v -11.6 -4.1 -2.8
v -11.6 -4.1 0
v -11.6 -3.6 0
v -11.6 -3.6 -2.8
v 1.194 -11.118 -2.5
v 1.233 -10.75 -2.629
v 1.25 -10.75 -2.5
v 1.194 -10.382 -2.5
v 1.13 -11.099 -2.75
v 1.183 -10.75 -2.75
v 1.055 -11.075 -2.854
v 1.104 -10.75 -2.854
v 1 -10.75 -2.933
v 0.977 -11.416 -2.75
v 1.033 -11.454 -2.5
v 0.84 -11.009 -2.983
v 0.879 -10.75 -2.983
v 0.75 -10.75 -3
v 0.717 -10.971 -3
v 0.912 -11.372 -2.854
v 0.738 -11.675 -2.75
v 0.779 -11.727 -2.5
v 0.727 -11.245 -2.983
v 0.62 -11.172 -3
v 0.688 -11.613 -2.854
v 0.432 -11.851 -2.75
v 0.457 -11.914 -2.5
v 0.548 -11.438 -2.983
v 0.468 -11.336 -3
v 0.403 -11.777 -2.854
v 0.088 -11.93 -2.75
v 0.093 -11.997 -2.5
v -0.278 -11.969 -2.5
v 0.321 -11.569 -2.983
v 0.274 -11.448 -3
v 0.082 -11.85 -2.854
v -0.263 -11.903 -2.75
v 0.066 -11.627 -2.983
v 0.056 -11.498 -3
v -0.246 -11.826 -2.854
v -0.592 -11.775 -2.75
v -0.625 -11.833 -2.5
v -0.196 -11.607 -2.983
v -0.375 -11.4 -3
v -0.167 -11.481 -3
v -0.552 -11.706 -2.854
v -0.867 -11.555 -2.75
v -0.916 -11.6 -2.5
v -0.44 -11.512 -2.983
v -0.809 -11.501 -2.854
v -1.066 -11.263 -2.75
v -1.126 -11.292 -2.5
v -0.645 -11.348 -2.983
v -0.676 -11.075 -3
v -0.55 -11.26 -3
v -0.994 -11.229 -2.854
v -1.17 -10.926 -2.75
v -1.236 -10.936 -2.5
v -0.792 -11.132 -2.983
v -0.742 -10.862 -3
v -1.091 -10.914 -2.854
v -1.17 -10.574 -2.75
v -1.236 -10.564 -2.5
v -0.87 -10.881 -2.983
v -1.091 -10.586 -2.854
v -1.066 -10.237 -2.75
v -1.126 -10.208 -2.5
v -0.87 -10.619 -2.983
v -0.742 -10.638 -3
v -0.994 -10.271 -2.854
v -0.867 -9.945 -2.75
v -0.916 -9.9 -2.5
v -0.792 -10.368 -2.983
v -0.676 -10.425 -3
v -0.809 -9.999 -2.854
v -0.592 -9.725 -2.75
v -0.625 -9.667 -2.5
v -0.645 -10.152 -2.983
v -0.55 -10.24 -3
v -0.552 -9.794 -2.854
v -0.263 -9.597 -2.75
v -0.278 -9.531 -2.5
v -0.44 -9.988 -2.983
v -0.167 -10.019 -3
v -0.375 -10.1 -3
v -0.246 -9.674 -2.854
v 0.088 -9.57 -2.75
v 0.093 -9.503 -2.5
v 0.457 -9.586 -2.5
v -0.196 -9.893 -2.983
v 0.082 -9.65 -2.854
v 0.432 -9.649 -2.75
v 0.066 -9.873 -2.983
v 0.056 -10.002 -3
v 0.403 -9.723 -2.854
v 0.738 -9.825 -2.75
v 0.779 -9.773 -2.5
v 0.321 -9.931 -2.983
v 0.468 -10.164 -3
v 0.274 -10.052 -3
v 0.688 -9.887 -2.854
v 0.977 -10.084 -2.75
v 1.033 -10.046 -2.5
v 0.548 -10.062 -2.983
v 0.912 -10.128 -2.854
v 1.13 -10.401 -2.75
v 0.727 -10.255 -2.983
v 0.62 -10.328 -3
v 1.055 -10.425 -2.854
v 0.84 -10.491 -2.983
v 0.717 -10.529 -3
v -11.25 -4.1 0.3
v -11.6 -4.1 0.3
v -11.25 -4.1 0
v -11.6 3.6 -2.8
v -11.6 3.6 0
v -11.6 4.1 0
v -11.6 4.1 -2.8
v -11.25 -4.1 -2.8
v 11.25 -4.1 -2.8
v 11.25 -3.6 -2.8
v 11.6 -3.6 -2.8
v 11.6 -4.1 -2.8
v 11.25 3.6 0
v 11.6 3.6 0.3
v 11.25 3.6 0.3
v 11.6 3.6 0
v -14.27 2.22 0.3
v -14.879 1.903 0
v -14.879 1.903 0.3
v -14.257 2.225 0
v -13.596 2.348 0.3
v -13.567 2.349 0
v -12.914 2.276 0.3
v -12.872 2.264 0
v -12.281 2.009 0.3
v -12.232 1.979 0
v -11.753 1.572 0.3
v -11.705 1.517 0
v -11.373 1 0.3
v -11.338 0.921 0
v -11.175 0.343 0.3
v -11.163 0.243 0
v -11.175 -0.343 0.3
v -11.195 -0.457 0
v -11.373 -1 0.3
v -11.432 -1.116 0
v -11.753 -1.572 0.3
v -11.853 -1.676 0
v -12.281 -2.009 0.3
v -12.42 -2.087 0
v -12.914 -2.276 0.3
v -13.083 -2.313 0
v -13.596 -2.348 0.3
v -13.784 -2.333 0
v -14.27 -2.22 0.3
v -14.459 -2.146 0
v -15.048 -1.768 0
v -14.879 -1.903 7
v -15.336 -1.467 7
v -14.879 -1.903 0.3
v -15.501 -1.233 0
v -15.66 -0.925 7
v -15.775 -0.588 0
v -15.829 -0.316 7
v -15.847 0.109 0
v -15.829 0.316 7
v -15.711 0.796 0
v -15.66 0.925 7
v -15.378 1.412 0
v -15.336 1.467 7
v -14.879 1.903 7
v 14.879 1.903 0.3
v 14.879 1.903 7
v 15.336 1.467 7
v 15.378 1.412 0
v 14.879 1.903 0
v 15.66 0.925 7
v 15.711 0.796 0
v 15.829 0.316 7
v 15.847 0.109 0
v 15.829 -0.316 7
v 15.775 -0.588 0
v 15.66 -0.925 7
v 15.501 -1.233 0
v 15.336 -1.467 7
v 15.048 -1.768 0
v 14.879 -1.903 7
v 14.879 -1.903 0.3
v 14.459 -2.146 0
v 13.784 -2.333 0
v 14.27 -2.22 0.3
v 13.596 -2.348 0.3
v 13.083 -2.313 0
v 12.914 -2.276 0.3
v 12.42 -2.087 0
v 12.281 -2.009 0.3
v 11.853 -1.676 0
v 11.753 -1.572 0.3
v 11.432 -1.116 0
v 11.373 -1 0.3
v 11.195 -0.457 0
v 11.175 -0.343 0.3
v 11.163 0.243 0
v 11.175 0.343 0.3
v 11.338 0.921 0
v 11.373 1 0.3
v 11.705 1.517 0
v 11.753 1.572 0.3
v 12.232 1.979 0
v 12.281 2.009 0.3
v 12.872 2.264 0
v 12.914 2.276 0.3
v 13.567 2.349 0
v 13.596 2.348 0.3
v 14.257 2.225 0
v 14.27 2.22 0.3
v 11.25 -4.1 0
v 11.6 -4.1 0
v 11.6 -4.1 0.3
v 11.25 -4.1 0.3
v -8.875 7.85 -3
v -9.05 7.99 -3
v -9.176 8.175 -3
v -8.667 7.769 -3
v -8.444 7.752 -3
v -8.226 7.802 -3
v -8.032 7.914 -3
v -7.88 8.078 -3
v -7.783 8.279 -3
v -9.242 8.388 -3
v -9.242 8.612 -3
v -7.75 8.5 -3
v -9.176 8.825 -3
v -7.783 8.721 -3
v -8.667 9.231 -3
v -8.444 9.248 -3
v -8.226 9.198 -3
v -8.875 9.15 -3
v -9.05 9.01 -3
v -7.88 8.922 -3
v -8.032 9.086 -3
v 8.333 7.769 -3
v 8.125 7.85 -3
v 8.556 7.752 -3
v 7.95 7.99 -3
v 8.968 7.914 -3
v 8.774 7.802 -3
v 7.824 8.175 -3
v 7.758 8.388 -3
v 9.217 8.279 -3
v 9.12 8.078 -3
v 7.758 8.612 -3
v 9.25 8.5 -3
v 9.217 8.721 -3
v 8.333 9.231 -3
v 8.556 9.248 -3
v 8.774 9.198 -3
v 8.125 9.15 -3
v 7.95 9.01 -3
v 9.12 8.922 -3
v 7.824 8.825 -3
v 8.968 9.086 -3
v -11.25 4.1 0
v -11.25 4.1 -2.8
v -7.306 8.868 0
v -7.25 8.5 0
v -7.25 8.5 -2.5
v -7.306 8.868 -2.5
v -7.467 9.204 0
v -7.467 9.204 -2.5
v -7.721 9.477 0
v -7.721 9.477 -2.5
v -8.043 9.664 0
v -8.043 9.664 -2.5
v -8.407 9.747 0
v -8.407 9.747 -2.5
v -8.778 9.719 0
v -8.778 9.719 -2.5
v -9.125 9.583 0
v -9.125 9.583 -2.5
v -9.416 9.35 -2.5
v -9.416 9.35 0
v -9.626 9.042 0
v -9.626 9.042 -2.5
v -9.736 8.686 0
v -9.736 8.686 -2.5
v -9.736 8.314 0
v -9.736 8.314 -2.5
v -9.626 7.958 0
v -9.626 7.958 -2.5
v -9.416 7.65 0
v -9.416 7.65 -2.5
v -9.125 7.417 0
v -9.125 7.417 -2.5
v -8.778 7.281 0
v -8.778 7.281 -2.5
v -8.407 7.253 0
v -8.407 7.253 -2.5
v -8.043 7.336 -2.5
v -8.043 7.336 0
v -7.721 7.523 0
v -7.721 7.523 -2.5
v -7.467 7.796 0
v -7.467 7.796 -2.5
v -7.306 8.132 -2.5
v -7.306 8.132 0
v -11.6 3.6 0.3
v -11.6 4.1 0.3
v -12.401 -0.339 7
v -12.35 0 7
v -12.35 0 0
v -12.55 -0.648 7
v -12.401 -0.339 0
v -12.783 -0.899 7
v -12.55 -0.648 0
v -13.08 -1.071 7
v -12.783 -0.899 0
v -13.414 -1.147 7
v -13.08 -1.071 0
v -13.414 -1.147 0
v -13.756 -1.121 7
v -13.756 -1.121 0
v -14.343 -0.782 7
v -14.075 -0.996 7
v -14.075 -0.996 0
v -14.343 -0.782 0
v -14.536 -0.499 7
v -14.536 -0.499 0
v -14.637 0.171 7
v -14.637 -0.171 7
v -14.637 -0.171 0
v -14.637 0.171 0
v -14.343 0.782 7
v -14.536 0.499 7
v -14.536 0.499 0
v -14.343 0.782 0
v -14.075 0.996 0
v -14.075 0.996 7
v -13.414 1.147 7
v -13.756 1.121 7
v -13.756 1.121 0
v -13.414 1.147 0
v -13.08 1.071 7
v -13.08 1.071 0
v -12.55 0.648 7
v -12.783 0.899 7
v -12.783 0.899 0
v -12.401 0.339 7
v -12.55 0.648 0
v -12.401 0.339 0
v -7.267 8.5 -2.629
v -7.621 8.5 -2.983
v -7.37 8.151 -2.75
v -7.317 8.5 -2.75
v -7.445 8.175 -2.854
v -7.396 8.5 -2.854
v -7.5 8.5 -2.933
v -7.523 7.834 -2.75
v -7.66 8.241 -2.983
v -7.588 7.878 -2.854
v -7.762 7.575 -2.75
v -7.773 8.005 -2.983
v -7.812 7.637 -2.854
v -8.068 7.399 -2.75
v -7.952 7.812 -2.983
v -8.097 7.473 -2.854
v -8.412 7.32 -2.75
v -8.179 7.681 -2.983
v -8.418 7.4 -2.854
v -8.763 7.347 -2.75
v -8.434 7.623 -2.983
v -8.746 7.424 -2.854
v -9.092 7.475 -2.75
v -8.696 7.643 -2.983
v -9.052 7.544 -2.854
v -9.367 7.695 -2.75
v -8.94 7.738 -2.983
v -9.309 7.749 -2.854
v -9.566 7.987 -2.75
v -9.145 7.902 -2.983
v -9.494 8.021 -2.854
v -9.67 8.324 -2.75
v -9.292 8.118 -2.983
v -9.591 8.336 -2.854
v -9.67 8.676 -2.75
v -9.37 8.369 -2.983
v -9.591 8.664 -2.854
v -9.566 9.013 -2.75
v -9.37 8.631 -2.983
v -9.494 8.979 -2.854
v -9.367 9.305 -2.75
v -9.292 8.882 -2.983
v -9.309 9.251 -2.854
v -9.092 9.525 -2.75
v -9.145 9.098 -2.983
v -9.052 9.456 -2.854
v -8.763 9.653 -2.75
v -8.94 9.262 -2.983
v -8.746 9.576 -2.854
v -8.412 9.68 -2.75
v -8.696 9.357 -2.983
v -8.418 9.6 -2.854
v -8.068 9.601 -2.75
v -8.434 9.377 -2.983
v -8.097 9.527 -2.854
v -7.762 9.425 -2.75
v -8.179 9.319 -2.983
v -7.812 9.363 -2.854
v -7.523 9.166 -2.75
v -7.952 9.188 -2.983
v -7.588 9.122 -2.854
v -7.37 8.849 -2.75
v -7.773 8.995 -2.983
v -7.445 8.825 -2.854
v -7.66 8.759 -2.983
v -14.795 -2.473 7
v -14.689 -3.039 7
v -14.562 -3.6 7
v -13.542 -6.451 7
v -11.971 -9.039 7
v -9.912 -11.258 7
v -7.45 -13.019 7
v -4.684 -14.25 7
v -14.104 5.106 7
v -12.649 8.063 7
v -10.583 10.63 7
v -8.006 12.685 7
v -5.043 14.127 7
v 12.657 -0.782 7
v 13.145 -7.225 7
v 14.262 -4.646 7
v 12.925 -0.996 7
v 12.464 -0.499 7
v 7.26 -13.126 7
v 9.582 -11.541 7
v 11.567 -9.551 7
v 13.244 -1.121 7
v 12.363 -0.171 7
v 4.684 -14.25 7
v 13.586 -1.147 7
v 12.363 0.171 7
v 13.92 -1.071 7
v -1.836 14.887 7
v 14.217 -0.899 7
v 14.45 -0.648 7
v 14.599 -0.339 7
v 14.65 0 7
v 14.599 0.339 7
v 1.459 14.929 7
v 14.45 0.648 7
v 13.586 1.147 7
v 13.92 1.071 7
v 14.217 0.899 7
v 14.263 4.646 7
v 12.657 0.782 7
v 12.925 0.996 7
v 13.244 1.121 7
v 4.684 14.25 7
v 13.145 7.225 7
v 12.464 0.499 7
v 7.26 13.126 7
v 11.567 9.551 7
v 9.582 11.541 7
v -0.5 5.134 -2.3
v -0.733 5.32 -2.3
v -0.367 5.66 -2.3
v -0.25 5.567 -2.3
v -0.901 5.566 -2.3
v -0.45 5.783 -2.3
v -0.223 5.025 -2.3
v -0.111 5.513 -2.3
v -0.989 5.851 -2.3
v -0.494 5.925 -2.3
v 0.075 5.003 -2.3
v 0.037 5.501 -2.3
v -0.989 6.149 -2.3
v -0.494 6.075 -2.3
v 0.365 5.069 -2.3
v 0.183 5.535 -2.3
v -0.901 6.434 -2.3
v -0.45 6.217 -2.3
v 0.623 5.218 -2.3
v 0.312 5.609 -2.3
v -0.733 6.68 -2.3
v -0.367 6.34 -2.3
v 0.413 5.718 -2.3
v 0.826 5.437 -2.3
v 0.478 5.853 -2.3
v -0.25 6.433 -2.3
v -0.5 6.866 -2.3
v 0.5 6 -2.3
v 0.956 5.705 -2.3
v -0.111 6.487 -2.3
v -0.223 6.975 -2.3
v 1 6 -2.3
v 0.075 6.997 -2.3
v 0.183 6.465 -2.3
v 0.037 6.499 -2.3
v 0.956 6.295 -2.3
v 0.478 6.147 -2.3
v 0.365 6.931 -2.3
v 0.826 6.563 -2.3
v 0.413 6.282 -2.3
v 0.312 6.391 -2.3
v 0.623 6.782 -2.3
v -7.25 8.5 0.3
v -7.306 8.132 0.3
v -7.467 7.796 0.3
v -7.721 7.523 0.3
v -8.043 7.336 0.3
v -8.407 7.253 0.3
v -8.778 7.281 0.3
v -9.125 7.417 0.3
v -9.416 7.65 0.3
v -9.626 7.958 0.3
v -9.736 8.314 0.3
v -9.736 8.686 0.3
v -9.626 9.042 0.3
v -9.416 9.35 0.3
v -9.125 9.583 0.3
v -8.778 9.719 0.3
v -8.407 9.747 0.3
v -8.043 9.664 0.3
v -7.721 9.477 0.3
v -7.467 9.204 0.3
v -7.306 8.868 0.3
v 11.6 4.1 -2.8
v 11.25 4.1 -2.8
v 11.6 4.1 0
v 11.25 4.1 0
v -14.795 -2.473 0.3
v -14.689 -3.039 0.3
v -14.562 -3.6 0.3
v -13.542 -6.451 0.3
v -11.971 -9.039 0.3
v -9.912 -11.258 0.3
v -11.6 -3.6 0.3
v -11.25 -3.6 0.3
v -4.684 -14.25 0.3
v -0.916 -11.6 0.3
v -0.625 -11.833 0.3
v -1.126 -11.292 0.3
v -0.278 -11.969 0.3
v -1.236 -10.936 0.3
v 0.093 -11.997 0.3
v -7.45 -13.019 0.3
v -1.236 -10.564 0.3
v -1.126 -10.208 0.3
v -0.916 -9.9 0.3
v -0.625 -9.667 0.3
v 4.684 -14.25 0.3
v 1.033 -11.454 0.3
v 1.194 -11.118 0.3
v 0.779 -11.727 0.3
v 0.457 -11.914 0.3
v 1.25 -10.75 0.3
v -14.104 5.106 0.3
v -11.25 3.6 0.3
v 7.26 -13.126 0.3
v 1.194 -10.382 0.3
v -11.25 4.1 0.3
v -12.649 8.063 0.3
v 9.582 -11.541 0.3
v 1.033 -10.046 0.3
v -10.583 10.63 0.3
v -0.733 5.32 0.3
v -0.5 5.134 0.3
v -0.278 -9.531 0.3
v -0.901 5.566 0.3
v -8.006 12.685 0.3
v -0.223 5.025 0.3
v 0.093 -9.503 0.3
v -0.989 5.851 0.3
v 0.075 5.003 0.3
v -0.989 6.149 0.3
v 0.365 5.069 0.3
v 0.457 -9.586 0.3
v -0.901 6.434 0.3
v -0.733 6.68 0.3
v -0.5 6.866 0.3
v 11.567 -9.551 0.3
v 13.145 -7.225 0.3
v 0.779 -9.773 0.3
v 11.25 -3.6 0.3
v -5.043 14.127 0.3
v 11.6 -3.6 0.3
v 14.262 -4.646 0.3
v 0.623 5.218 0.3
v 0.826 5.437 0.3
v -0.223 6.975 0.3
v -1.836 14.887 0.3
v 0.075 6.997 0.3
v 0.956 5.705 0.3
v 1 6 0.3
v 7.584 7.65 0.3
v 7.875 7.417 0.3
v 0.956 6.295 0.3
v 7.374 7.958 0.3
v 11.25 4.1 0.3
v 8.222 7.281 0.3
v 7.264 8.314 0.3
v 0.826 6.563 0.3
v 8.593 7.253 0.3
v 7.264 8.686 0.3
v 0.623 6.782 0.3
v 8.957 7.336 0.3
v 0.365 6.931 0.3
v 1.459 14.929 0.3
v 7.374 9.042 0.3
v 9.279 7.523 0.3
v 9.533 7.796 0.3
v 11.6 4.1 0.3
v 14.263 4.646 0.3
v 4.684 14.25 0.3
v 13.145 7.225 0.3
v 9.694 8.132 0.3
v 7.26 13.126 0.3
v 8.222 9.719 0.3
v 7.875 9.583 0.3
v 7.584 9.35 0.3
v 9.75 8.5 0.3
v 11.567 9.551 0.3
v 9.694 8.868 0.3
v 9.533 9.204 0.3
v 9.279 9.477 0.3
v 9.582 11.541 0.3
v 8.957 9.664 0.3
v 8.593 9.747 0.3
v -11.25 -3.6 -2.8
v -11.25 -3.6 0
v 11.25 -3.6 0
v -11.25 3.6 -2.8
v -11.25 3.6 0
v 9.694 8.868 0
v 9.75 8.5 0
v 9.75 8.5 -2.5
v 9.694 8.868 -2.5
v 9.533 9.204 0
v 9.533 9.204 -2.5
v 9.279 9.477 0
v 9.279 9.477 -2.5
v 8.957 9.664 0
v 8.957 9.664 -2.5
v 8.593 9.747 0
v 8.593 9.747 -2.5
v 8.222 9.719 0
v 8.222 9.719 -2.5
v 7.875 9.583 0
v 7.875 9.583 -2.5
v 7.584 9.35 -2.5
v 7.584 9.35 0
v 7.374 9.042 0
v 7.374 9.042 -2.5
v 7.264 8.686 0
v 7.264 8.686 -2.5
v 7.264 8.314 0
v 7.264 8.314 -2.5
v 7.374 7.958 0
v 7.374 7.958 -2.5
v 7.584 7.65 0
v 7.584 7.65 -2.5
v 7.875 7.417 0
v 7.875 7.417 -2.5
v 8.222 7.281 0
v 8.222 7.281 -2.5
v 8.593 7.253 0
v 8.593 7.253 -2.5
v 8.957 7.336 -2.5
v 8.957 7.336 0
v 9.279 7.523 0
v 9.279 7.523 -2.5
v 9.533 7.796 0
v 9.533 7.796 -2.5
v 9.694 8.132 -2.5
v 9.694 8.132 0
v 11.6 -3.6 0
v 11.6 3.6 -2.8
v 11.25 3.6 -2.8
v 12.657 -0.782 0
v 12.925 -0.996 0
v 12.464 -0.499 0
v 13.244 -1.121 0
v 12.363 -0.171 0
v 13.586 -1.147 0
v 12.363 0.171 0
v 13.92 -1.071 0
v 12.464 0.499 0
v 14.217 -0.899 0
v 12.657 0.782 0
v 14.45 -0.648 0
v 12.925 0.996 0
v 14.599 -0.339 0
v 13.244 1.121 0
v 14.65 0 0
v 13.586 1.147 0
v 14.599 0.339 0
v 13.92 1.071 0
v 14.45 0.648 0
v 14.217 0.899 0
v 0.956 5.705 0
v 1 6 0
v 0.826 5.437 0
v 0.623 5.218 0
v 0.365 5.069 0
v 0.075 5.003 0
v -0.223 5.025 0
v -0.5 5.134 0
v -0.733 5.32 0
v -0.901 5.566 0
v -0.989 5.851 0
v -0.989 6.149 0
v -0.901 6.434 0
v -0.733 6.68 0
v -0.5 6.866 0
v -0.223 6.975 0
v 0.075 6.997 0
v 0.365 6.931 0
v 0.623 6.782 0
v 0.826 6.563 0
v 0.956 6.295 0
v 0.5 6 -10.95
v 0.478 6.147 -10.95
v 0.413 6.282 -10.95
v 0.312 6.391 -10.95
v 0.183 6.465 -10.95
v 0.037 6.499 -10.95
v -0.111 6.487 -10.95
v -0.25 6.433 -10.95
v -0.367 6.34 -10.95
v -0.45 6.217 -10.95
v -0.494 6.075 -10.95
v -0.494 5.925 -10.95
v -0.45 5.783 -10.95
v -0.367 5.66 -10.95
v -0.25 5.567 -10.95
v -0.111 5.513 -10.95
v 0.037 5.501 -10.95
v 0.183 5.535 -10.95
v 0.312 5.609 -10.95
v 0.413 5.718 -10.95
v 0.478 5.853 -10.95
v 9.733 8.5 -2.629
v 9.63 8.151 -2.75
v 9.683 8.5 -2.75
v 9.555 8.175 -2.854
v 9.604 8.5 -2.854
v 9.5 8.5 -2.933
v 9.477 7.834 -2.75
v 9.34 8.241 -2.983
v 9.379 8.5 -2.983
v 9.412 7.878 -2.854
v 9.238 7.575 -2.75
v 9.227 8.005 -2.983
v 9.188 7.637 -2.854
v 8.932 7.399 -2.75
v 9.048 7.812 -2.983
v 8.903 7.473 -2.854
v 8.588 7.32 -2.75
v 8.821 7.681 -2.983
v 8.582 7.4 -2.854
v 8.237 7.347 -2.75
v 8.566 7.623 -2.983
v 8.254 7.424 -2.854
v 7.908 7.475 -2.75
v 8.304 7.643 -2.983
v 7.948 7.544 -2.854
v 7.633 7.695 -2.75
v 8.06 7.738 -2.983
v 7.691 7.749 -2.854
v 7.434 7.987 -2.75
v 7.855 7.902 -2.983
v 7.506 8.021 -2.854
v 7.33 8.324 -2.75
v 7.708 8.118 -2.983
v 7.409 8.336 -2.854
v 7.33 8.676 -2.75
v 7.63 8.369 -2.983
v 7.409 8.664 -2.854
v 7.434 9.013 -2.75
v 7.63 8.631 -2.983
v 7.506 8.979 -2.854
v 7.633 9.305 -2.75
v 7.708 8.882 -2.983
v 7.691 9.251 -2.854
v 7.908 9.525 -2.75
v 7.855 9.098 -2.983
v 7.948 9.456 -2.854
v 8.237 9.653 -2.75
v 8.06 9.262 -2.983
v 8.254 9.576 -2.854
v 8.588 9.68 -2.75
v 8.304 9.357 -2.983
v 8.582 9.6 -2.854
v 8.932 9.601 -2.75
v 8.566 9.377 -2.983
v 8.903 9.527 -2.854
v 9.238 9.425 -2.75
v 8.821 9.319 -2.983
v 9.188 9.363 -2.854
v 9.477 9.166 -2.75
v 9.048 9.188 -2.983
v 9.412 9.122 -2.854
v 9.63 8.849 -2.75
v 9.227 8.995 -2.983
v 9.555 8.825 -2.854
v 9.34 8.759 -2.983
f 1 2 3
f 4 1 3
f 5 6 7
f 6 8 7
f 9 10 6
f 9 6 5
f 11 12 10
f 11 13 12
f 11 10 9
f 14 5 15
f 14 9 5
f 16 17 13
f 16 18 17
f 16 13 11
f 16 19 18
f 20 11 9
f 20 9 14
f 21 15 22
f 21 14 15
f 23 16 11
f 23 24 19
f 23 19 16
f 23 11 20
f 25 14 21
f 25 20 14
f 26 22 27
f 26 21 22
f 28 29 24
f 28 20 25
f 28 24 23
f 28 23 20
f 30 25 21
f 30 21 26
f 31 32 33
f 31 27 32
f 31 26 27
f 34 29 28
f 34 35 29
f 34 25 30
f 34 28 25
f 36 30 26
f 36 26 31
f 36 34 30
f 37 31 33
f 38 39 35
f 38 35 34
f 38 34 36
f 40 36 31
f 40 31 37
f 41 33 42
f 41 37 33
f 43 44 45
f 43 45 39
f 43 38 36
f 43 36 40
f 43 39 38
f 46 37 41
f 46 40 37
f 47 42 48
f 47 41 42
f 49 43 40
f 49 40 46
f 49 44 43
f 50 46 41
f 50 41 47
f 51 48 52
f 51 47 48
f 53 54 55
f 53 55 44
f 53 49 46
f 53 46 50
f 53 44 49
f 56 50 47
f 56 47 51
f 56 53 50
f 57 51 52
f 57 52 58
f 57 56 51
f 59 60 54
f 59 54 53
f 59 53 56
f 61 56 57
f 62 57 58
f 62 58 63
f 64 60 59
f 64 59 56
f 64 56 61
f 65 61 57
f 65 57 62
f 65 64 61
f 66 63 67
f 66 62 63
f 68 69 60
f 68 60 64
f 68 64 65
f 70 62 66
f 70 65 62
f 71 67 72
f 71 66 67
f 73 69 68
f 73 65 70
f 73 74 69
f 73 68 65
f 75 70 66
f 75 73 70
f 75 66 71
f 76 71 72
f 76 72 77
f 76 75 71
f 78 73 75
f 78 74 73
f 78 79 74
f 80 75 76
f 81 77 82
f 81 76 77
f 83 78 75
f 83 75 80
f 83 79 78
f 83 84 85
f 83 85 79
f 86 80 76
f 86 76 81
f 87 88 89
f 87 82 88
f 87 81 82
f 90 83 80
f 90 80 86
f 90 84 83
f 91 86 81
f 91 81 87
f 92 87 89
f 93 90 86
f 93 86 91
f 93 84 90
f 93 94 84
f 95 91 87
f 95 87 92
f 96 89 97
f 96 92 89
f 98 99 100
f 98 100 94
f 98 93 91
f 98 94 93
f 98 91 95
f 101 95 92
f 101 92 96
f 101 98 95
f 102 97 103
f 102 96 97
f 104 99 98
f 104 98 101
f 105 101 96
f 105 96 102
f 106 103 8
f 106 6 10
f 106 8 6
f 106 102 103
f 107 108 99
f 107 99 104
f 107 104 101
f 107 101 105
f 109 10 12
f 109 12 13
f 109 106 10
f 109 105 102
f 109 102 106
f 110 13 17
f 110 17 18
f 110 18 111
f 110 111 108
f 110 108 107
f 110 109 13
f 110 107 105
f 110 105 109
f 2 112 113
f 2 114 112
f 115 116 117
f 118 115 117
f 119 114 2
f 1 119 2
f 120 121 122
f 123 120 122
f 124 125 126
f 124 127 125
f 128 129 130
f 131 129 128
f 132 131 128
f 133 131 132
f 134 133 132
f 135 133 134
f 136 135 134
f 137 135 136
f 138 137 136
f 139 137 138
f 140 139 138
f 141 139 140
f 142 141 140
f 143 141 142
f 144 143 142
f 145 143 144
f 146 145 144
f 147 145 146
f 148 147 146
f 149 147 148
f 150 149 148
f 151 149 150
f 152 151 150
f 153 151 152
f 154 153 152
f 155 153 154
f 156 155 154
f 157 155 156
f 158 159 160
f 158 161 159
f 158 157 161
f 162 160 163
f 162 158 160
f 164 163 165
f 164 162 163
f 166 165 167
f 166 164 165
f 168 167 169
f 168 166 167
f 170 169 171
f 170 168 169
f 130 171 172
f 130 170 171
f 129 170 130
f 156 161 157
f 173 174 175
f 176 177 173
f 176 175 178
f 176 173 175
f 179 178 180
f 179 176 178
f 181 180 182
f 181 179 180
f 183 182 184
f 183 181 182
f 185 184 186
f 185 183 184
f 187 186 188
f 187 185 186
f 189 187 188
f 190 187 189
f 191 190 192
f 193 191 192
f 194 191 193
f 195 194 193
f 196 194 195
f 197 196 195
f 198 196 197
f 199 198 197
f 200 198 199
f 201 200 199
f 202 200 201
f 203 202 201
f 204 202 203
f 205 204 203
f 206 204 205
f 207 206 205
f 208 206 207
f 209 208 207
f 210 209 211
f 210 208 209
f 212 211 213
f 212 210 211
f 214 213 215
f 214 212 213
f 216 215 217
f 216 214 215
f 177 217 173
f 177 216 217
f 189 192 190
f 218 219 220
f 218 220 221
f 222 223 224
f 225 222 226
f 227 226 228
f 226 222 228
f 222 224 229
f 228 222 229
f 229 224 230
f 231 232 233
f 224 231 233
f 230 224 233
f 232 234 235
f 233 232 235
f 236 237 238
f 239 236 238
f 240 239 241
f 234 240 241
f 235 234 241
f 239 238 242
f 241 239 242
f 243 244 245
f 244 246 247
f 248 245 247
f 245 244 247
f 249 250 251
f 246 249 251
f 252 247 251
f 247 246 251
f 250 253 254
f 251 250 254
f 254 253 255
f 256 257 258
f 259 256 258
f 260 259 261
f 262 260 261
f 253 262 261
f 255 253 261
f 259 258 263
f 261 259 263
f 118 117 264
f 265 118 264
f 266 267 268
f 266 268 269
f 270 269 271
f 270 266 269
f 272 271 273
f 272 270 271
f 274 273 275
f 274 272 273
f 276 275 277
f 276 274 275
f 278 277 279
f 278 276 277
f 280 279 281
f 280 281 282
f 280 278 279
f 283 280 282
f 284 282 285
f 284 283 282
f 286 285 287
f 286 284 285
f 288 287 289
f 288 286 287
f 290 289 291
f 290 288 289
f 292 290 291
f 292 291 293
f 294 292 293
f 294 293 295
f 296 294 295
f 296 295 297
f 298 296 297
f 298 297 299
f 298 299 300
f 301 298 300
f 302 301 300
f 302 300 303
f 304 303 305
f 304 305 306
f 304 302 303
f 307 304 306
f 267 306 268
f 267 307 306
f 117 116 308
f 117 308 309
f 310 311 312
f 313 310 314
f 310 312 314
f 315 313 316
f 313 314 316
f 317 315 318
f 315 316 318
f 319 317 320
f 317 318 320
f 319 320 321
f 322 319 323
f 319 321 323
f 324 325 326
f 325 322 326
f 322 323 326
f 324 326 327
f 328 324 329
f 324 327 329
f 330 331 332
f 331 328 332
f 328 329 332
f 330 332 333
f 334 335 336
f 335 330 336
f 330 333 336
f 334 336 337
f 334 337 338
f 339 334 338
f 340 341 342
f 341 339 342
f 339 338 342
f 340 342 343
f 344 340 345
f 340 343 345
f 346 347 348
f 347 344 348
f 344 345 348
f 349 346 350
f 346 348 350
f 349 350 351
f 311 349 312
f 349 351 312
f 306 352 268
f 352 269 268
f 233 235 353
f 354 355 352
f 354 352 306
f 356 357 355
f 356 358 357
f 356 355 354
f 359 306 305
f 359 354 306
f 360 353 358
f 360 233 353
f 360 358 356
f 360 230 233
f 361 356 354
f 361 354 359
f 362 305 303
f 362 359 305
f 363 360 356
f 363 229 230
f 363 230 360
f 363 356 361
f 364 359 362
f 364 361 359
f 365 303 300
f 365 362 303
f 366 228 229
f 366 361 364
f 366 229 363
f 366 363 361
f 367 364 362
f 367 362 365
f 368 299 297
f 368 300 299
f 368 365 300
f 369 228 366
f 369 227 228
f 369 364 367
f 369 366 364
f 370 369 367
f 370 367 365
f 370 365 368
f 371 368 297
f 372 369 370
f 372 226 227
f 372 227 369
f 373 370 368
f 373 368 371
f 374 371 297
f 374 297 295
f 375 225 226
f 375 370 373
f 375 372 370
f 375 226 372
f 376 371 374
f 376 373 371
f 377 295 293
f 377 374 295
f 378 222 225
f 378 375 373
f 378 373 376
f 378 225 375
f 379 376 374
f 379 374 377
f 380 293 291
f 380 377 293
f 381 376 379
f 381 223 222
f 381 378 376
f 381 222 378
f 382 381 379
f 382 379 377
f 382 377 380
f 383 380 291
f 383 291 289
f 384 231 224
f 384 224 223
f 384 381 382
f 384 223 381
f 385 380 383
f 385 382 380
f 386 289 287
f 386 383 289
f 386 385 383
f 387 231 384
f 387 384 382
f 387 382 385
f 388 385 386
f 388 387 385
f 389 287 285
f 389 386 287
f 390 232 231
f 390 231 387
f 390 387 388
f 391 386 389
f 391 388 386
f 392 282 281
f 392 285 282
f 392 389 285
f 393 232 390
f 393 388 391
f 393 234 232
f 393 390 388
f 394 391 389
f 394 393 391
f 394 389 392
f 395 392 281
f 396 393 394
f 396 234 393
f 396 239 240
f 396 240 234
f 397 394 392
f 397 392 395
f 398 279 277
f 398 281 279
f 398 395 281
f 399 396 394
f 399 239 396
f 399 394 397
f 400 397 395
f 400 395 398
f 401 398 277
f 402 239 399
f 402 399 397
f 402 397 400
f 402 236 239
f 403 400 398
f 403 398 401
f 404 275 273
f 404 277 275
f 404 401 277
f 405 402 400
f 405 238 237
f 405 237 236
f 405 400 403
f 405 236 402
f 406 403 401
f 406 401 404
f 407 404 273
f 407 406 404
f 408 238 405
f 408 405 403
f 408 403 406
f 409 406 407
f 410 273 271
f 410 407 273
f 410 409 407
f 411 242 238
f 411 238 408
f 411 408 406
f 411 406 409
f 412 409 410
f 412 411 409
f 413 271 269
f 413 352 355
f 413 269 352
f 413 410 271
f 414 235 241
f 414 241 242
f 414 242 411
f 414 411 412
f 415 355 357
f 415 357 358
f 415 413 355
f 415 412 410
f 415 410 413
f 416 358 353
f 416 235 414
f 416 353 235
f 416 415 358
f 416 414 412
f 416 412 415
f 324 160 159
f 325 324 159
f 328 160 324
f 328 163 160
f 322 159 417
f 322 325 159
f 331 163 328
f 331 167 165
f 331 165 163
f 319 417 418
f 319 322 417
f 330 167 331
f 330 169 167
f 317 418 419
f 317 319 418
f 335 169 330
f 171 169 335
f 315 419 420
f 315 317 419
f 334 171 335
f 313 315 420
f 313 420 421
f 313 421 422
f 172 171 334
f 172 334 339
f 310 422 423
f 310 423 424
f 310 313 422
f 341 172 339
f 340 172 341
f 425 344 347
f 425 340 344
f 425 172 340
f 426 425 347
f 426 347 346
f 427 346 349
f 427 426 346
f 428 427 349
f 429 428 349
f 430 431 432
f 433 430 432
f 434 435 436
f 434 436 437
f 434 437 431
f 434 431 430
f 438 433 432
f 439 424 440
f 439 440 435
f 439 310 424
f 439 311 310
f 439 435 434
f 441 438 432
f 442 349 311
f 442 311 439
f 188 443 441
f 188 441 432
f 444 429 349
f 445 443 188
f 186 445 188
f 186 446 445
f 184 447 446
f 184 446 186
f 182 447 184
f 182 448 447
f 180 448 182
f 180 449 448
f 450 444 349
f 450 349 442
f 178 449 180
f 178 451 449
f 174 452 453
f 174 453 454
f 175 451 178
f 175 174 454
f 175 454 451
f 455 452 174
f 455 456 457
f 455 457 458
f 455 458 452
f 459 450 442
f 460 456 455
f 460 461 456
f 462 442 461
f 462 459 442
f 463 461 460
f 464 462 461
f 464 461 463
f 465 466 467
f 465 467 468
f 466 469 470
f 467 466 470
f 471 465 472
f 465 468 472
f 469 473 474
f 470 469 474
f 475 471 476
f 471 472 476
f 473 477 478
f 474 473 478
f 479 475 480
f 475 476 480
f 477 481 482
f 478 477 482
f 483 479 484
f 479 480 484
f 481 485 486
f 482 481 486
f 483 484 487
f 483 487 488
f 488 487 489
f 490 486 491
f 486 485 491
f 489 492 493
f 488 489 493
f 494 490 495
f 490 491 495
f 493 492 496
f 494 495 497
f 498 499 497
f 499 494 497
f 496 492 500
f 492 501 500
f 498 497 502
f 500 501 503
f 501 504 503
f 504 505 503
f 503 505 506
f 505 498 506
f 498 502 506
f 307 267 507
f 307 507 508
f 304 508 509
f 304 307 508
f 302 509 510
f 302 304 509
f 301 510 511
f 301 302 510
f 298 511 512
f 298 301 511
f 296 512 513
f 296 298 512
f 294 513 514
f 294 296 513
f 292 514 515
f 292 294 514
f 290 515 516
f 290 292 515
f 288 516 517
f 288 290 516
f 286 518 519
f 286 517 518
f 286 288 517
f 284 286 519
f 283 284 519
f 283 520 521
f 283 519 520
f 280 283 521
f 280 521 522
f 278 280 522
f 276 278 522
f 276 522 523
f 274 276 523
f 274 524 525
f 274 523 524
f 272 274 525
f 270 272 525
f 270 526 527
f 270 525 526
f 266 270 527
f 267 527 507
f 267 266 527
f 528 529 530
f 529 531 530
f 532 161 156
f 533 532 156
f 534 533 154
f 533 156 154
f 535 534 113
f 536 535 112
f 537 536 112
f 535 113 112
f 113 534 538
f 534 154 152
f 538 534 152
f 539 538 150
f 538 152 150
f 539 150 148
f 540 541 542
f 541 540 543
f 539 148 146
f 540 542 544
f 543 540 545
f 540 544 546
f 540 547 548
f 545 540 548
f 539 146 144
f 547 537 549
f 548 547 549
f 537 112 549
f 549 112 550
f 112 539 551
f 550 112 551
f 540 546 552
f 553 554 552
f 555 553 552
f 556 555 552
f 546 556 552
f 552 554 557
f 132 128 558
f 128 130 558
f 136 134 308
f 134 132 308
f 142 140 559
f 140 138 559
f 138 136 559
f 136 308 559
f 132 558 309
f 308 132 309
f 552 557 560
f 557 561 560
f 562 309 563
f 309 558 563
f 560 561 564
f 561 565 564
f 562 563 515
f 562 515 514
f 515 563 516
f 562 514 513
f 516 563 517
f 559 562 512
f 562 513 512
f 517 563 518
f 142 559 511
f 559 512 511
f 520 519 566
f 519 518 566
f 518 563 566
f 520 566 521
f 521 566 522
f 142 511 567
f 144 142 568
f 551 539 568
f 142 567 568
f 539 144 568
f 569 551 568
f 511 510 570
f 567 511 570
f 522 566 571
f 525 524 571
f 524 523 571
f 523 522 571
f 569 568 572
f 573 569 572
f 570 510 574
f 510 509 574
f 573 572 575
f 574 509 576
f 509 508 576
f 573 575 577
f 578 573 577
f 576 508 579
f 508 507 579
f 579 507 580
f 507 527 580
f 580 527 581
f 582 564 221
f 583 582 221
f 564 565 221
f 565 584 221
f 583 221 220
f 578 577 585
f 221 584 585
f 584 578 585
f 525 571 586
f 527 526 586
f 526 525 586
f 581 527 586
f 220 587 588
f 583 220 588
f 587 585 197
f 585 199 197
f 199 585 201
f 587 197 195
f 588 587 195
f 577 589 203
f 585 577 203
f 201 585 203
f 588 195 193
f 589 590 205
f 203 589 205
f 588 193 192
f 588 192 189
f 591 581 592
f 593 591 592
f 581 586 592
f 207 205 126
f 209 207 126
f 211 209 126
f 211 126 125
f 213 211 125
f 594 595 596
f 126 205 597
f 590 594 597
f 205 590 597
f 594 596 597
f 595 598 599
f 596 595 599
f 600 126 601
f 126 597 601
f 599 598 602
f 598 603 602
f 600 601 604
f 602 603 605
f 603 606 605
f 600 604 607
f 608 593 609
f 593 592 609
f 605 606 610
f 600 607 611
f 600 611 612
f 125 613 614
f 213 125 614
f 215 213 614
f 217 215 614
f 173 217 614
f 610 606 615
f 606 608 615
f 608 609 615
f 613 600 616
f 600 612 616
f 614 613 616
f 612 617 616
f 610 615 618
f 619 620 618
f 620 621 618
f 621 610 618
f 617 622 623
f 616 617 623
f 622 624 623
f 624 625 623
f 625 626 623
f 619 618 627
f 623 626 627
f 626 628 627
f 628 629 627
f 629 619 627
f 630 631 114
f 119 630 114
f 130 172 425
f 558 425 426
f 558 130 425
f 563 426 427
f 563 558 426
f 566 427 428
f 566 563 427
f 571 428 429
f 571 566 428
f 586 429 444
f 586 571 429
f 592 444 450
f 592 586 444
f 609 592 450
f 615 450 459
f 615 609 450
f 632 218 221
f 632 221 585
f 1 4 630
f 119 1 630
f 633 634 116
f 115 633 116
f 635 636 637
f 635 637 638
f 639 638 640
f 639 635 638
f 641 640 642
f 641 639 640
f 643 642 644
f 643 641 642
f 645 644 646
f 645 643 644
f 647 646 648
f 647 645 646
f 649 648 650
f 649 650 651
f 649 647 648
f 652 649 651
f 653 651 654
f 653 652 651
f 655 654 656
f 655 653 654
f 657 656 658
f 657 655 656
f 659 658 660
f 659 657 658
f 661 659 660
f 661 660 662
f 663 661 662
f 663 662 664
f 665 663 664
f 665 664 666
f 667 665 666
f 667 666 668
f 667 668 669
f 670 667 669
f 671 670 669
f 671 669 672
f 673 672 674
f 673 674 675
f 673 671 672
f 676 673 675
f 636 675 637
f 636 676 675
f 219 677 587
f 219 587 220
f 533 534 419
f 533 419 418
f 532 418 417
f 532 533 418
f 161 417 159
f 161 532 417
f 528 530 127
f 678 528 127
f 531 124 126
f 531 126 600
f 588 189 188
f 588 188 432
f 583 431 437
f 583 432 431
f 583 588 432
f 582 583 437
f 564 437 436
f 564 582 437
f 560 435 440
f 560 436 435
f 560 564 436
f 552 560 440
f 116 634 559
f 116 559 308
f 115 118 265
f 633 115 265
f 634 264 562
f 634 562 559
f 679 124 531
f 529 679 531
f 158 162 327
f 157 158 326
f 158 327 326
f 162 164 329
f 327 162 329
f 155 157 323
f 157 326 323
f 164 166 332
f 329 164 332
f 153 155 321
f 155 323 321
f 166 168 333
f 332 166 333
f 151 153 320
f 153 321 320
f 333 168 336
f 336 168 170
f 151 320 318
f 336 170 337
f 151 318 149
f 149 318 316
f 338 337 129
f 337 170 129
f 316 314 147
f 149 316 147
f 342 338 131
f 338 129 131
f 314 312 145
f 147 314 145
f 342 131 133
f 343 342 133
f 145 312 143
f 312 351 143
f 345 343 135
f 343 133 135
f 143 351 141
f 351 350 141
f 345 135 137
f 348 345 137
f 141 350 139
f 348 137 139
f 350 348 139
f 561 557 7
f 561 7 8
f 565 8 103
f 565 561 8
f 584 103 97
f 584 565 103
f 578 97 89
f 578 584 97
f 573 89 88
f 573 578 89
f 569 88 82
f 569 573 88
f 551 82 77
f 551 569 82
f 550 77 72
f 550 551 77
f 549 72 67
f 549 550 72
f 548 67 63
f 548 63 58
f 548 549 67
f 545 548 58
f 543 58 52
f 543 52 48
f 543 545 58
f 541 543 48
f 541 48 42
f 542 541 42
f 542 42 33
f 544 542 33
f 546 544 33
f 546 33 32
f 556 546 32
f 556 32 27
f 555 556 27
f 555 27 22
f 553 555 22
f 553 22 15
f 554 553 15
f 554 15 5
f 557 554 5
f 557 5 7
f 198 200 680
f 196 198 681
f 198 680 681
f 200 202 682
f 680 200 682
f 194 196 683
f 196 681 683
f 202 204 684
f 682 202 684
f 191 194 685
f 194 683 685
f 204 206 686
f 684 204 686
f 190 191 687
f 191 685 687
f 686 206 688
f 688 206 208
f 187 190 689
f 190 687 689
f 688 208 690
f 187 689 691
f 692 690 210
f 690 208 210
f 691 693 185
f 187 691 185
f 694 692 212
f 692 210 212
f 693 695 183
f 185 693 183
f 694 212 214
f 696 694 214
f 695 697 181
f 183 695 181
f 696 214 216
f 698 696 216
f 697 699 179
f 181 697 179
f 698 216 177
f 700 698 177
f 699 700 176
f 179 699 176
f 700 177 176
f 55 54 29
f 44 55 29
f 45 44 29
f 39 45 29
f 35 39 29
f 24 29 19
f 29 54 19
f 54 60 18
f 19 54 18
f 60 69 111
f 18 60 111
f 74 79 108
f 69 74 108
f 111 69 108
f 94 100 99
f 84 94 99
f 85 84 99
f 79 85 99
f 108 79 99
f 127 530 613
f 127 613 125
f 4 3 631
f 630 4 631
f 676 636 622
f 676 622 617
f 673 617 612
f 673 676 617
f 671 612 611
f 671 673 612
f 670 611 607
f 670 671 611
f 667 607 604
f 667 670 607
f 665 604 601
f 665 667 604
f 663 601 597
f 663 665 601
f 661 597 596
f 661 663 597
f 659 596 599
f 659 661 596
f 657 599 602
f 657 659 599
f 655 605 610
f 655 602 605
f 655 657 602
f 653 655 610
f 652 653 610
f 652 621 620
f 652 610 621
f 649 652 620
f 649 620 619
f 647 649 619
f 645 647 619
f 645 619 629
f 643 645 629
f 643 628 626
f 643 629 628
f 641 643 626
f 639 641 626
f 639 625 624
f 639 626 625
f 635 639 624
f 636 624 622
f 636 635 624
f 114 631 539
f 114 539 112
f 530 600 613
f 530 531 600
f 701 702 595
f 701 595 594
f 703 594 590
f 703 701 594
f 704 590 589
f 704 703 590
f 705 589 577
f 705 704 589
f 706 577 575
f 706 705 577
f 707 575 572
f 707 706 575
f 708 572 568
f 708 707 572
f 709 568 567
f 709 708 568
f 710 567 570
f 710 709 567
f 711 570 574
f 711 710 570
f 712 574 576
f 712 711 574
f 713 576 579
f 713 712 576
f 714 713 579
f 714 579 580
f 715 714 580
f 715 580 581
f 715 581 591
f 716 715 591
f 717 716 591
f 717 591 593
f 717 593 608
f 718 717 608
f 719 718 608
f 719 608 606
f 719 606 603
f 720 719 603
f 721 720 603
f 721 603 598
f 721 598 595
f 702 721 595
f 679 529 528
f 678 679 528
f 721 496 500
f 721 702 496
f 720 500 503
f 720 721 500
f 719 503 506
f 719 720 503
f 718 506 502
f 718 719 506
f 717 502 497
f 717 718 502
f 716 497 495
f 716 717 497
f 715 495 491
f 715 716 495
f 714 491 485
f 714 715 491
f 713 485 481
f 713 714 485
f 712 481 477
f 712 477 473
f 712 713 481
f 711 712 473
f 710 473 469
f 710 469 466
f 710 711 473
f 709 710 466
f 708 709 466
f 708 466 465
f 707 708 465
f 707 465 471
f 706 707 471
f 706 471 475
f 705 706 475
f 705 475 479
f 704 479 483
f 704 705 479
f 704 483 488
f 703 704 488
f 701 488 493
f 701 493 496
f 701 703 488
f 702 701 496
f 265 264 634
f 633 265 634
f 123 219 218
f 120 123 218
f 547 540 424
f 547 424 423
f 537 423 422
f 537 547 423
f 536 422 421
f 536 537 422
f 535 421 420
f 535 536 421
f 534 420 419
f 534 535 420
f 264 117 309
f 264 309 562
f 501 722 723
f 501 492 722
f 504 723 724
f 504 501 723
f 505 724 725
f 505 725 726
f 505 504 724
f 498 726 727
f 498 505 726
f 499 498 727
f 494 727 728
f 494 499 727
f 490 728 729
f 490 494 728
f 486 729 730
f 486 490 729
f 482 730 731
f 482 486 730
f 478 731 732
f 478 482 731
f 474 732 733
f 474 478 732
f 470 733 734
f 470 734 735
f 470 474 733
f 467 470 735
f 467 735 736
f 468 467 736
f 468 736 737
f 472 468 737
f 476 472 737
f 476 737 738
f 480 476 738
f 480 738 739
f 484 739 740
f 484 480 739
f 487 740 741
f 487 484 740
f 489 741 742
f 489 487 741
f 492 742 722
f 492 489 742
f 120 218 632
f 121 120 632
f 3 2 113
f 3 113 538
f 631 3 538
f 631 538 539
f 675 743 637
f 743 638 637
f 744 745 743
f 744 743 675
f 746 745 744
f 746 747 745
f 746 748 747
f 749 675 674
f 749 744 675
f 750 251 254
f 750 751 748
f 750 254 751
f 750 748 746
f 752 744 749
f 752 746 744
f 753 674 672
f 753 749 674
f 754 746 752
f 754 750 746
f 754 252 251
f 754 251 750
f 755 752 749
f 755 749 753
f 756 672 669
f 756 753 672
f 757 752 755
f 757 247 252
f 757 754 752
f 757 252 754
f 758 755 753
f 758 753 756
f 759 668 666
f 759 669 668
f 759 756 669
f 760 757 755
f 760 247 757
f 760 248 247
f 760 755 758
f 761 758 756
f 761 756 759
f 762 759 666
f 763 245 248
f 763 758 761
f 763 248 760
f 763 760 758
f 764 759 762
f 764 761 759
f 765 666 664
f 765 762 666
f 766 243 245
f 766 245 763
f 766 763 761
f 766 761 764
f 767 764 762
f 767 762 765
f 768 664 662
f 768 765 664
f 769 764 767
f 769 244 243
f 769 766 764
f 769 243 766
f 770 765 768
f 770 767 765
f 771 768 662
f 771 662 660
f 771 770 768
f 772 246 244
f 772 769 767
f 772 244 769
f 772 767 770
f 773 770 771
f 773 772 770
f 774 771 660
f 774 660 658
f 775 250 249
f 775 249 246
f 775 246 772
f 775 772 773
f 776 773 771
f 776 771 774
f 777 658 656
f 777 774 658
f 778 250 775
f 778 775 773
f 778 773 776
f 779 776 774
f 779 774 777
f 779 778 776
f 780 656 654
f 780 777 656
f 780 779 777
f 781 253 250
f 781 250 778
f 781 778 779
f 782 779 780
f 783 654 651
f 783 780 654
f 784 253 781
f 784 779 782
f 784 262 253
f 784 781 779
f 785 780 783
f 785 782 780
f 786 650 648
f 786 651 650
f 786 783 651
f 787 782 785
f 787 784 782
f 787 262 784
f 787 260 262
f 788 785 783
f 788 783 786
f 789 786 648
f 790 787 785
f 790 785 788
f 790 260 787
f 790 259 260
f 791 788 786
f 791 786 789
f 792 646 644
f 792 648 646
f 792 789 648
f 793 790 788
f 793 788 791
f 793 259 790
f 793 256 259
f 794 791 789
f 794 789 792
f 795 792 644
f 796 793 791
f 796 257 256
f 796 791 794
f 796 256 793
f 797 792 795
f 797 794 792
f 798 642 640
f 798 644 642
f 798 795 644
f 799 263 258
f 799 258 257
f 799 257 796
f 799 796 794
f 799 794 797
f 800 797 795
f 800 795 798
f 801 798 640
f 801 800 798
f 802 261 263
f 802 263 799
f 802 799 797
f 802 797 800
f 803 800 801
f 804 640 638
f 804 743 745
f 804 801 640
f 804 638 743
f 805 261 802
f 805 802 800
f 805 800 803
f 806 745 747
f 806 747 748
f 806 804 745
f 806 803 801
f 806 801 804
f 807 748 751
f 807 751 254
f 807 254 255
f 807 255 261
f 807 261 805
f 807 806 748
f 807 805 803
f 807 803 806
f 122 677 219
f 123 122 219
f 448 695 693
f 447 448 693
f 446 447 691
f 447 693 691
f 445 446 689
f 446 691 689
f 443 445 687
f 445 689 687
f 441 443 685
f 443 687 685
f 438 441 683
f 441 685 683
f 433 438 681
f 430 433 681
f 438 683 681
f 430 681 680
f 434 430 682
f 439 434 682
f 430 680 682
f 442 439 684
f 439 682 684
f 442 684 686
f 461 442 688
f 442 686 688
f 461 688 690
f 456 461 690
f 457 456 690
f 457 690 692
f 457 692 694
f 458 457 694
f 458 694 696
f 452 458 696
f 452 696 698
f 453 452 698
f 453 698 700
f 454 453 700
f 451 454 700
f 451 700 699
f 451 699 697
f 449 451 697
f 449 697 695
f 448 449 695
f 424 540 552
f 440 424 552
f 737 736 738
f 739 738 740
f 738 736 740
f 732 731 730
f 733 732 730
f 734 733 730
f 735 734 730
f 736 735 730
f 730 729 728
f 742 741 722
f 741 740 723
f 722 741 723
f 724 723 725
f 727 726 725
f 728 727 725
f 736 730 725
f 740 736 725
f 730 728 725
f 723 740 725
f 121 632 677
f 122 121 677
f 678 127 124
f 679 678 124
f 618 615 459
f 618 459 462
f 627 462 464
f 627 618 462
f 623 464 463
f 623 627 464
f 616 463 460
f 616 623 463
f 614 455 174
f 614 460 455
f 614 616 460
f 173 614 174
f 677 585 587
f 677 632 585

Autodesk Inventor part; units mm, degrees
ref_plane "YZ Plane" through (0, 0, 0) normal (1, 0, 0) x (0, 1, 0)
ref_plane "XZ Plane" through (0, 0, 0) normal (0, 1, 0) x (-1, 0, 0)
ref_plane "XY Plane" through (0, 0, 0) normal (0, 0, 1) x (1, 0, 0)
sketch "Sketch1" plane through (0, 0, 0) normal (0, 0, 1) x (1, 0, 0)
  line L0 (-24.6776, 0) -> (23.5544, 0) projected
  line L1 (0, -22.6406) -> (0, 25.7747) projected
  circle A0 centre (-13.5, 0) radius 1.15
  circle A1 centre (-13.5, 0) radius 2.35
  circle A2 centre (13.5, 0) radius 1.15
  circle A3 centre (13.5, 0) radius 2.35
  circle A4 centre (0, 6) radius 1
  circle A5 centre (0, 6) radius 0.5
  circle A6 centre (0, -10.75) radius 1.25
  circle A7 centre (-8.5, 8.5) radius 1.25
  circle A8 centre (8.5, 8.5) radius 1.25
  line L2 (-11.6, -3.6) -> (-11.25, -3.6)
  line L3 (-11.25, -3.6) -> (-11.25, -4.1)
  line L4 (-11.25, -4.1) -> (-11.6, -4.1)
  line L5 (-11.6, -4.1) -> (-11.6, -3.6)
  line L6 (11.25, -4.1) -> (11.25, -3.6)
  line L7 (11.25, -3.6) -> (11.6, -3.6)
  line L8 (11.6, -3.6) -> (11.6, -4.1)
  line L9 (11.6, -4.1) -> (11.25, -4.1)
  line L10 (-11.6, 3.6) -> (-11.6, 4.1)
  line L11 (-11.6, 4.1) -> (-11.25, 4.1)
  line L12 (-11.25, 4.1) -> (-11.25, 3.6)
  line L13 (-11.25, 3.6) -> (-11.6, 3.6)
  line L14 (11.25, 3.6) -> (11.25, 4.1)
  line L15 (11.25, 4.1) -> (11.6, 4.1)
  line L16 (11.6, 4.1) -> (11.6, 3.6)
  line L17 (11.6, 3.6) -> (11.25, 3.6)
  arc A9 (14.8788, 1.903) -> (4.6837, 14.25) centre (0, 0) ccw
  arc A10 (4.6837, 14.25) -> (-14.8788, 1.903) centre (0, 0) ccw
  arc A11 (4.6837, -14.25) -> (14.8788, -1.903) centre (0, 0) ccw
  circle A12 centre (5.4353, -14.25) radius 0.1148
  line L18 (-4.6837, -14.25) -> (4.6837, -14.25)
  arc A13 (14.8788, 1.903) -> (-14.8788, 1.903) centre (0, 0) ccw
  arc A14 (-14.8788, -1.903) -> (-14.5616, -3.6) centre (0, 0) ccw
  arc A15 (-14.5616, -3.6) -> (-4.6837, -14.25) centre (0, 0) ccw
  arc A16 (-14.5616, 3.6) -> (-14.8788, 1.903) centre (0, 0) ccw
  arc A17 (0, 15) -> (-14.5616, 3.6) centre (0, 0) ccw
  arc A18 (-14.5616, 3.6) -> (-14.8788, 1.903) centre (0, 0) ccw
  point P0 (-15.6415, -0.9678)
  point P1 (0, -15.6714)
  point P2 (15.1605, -1.6629)
  dimension "d2" = 2.3
  dimension "d3" = 4.7
  dimension "d4" = 13.5
  dimension "d7" = 360
  dimension "d9" = 2
  dimension "d10" = 1
  dimension "d11" = 6
  dimension "d12" = 2.5
  dimension "d13" = 10.75
  dimension "d14" = 19.25
  dimension "d16" = 8.5
  dimension "d17" = 0.35
  dimension "d18" = 0.5
  dimension "d19" = 11.25
  dimension "d20" = 3.6
  dimension "d23" = 22.85
  dimension "d26" = 7.7
  dimension "d48" = 14.25
extrude "Extrusion1" add sketch "Sketch1" along normal blind 7 contours A0 L0 A1 | L0 A1 A0 | A1 A10 L1 A4 L0 | L0 L1 A6 L18 A15 A14 A1 | L1 A4 A10 A9 A3 L0 | L0 A3 A11 L18 L1 A6 | A3 L0 A2 | L0 A2 A3 | A6 L1 | L1 A6 | A4 L1 A5 | L1 A5 A4 | A5 L1 | L1 A5 | A7 | A8 | L2 L3 L4 L5 | L6 L7 L8 L9 | L10 L11 L12 L13 | L14 L15 L16 L17
sketch "Sketch2" plane through (0, 0, 0) normal (0, 0, -1) x (-1, 0, 0)
  point P0 (0, 0)
extrude "Extrusion2" add sketch "Sketch1" against normal blind 3 contours A6 L1 | L1 A6 | A7 | A8
fillet "Fillet1" radius 0.5 3 edges at (7.25, 8.5, -3) (-1.25, -10.75, -3) (-9.75, 8.5, -3)
extrude "Extrusion3" add sketch "Sketch1" against normal blind 10.95 contours A5 L1 | L1 A5
extrude "Extrusion4" add sketch "Sketch1" against normal blind 2.3 contours A4 L1 A5 | L1 A5 A4
extrude "Extrusion5" add sketch "Sketch1" against normal blind 2.8 contours L2 L3 L4 L5 | L6 L7 L8 L9 | L10 L11 L12 L13 | L14 L15 L16 L17
extrude "Extrusion6" cut sketch "Sketch1" along normal blind 0.3 contours A1 A10 L1 A4 L0 | L0 L1 A6 L18 A15 A14 A1 | L1 A4 A10 A9 A3 L0 | L0 A3 A11 L18 L1 A6
equation "\"d23\" = 2 * d19 + d17"
equation "\"d26\" = 2 * d20 + d18"
properties part number "VID26" material "PBT Plastic"
